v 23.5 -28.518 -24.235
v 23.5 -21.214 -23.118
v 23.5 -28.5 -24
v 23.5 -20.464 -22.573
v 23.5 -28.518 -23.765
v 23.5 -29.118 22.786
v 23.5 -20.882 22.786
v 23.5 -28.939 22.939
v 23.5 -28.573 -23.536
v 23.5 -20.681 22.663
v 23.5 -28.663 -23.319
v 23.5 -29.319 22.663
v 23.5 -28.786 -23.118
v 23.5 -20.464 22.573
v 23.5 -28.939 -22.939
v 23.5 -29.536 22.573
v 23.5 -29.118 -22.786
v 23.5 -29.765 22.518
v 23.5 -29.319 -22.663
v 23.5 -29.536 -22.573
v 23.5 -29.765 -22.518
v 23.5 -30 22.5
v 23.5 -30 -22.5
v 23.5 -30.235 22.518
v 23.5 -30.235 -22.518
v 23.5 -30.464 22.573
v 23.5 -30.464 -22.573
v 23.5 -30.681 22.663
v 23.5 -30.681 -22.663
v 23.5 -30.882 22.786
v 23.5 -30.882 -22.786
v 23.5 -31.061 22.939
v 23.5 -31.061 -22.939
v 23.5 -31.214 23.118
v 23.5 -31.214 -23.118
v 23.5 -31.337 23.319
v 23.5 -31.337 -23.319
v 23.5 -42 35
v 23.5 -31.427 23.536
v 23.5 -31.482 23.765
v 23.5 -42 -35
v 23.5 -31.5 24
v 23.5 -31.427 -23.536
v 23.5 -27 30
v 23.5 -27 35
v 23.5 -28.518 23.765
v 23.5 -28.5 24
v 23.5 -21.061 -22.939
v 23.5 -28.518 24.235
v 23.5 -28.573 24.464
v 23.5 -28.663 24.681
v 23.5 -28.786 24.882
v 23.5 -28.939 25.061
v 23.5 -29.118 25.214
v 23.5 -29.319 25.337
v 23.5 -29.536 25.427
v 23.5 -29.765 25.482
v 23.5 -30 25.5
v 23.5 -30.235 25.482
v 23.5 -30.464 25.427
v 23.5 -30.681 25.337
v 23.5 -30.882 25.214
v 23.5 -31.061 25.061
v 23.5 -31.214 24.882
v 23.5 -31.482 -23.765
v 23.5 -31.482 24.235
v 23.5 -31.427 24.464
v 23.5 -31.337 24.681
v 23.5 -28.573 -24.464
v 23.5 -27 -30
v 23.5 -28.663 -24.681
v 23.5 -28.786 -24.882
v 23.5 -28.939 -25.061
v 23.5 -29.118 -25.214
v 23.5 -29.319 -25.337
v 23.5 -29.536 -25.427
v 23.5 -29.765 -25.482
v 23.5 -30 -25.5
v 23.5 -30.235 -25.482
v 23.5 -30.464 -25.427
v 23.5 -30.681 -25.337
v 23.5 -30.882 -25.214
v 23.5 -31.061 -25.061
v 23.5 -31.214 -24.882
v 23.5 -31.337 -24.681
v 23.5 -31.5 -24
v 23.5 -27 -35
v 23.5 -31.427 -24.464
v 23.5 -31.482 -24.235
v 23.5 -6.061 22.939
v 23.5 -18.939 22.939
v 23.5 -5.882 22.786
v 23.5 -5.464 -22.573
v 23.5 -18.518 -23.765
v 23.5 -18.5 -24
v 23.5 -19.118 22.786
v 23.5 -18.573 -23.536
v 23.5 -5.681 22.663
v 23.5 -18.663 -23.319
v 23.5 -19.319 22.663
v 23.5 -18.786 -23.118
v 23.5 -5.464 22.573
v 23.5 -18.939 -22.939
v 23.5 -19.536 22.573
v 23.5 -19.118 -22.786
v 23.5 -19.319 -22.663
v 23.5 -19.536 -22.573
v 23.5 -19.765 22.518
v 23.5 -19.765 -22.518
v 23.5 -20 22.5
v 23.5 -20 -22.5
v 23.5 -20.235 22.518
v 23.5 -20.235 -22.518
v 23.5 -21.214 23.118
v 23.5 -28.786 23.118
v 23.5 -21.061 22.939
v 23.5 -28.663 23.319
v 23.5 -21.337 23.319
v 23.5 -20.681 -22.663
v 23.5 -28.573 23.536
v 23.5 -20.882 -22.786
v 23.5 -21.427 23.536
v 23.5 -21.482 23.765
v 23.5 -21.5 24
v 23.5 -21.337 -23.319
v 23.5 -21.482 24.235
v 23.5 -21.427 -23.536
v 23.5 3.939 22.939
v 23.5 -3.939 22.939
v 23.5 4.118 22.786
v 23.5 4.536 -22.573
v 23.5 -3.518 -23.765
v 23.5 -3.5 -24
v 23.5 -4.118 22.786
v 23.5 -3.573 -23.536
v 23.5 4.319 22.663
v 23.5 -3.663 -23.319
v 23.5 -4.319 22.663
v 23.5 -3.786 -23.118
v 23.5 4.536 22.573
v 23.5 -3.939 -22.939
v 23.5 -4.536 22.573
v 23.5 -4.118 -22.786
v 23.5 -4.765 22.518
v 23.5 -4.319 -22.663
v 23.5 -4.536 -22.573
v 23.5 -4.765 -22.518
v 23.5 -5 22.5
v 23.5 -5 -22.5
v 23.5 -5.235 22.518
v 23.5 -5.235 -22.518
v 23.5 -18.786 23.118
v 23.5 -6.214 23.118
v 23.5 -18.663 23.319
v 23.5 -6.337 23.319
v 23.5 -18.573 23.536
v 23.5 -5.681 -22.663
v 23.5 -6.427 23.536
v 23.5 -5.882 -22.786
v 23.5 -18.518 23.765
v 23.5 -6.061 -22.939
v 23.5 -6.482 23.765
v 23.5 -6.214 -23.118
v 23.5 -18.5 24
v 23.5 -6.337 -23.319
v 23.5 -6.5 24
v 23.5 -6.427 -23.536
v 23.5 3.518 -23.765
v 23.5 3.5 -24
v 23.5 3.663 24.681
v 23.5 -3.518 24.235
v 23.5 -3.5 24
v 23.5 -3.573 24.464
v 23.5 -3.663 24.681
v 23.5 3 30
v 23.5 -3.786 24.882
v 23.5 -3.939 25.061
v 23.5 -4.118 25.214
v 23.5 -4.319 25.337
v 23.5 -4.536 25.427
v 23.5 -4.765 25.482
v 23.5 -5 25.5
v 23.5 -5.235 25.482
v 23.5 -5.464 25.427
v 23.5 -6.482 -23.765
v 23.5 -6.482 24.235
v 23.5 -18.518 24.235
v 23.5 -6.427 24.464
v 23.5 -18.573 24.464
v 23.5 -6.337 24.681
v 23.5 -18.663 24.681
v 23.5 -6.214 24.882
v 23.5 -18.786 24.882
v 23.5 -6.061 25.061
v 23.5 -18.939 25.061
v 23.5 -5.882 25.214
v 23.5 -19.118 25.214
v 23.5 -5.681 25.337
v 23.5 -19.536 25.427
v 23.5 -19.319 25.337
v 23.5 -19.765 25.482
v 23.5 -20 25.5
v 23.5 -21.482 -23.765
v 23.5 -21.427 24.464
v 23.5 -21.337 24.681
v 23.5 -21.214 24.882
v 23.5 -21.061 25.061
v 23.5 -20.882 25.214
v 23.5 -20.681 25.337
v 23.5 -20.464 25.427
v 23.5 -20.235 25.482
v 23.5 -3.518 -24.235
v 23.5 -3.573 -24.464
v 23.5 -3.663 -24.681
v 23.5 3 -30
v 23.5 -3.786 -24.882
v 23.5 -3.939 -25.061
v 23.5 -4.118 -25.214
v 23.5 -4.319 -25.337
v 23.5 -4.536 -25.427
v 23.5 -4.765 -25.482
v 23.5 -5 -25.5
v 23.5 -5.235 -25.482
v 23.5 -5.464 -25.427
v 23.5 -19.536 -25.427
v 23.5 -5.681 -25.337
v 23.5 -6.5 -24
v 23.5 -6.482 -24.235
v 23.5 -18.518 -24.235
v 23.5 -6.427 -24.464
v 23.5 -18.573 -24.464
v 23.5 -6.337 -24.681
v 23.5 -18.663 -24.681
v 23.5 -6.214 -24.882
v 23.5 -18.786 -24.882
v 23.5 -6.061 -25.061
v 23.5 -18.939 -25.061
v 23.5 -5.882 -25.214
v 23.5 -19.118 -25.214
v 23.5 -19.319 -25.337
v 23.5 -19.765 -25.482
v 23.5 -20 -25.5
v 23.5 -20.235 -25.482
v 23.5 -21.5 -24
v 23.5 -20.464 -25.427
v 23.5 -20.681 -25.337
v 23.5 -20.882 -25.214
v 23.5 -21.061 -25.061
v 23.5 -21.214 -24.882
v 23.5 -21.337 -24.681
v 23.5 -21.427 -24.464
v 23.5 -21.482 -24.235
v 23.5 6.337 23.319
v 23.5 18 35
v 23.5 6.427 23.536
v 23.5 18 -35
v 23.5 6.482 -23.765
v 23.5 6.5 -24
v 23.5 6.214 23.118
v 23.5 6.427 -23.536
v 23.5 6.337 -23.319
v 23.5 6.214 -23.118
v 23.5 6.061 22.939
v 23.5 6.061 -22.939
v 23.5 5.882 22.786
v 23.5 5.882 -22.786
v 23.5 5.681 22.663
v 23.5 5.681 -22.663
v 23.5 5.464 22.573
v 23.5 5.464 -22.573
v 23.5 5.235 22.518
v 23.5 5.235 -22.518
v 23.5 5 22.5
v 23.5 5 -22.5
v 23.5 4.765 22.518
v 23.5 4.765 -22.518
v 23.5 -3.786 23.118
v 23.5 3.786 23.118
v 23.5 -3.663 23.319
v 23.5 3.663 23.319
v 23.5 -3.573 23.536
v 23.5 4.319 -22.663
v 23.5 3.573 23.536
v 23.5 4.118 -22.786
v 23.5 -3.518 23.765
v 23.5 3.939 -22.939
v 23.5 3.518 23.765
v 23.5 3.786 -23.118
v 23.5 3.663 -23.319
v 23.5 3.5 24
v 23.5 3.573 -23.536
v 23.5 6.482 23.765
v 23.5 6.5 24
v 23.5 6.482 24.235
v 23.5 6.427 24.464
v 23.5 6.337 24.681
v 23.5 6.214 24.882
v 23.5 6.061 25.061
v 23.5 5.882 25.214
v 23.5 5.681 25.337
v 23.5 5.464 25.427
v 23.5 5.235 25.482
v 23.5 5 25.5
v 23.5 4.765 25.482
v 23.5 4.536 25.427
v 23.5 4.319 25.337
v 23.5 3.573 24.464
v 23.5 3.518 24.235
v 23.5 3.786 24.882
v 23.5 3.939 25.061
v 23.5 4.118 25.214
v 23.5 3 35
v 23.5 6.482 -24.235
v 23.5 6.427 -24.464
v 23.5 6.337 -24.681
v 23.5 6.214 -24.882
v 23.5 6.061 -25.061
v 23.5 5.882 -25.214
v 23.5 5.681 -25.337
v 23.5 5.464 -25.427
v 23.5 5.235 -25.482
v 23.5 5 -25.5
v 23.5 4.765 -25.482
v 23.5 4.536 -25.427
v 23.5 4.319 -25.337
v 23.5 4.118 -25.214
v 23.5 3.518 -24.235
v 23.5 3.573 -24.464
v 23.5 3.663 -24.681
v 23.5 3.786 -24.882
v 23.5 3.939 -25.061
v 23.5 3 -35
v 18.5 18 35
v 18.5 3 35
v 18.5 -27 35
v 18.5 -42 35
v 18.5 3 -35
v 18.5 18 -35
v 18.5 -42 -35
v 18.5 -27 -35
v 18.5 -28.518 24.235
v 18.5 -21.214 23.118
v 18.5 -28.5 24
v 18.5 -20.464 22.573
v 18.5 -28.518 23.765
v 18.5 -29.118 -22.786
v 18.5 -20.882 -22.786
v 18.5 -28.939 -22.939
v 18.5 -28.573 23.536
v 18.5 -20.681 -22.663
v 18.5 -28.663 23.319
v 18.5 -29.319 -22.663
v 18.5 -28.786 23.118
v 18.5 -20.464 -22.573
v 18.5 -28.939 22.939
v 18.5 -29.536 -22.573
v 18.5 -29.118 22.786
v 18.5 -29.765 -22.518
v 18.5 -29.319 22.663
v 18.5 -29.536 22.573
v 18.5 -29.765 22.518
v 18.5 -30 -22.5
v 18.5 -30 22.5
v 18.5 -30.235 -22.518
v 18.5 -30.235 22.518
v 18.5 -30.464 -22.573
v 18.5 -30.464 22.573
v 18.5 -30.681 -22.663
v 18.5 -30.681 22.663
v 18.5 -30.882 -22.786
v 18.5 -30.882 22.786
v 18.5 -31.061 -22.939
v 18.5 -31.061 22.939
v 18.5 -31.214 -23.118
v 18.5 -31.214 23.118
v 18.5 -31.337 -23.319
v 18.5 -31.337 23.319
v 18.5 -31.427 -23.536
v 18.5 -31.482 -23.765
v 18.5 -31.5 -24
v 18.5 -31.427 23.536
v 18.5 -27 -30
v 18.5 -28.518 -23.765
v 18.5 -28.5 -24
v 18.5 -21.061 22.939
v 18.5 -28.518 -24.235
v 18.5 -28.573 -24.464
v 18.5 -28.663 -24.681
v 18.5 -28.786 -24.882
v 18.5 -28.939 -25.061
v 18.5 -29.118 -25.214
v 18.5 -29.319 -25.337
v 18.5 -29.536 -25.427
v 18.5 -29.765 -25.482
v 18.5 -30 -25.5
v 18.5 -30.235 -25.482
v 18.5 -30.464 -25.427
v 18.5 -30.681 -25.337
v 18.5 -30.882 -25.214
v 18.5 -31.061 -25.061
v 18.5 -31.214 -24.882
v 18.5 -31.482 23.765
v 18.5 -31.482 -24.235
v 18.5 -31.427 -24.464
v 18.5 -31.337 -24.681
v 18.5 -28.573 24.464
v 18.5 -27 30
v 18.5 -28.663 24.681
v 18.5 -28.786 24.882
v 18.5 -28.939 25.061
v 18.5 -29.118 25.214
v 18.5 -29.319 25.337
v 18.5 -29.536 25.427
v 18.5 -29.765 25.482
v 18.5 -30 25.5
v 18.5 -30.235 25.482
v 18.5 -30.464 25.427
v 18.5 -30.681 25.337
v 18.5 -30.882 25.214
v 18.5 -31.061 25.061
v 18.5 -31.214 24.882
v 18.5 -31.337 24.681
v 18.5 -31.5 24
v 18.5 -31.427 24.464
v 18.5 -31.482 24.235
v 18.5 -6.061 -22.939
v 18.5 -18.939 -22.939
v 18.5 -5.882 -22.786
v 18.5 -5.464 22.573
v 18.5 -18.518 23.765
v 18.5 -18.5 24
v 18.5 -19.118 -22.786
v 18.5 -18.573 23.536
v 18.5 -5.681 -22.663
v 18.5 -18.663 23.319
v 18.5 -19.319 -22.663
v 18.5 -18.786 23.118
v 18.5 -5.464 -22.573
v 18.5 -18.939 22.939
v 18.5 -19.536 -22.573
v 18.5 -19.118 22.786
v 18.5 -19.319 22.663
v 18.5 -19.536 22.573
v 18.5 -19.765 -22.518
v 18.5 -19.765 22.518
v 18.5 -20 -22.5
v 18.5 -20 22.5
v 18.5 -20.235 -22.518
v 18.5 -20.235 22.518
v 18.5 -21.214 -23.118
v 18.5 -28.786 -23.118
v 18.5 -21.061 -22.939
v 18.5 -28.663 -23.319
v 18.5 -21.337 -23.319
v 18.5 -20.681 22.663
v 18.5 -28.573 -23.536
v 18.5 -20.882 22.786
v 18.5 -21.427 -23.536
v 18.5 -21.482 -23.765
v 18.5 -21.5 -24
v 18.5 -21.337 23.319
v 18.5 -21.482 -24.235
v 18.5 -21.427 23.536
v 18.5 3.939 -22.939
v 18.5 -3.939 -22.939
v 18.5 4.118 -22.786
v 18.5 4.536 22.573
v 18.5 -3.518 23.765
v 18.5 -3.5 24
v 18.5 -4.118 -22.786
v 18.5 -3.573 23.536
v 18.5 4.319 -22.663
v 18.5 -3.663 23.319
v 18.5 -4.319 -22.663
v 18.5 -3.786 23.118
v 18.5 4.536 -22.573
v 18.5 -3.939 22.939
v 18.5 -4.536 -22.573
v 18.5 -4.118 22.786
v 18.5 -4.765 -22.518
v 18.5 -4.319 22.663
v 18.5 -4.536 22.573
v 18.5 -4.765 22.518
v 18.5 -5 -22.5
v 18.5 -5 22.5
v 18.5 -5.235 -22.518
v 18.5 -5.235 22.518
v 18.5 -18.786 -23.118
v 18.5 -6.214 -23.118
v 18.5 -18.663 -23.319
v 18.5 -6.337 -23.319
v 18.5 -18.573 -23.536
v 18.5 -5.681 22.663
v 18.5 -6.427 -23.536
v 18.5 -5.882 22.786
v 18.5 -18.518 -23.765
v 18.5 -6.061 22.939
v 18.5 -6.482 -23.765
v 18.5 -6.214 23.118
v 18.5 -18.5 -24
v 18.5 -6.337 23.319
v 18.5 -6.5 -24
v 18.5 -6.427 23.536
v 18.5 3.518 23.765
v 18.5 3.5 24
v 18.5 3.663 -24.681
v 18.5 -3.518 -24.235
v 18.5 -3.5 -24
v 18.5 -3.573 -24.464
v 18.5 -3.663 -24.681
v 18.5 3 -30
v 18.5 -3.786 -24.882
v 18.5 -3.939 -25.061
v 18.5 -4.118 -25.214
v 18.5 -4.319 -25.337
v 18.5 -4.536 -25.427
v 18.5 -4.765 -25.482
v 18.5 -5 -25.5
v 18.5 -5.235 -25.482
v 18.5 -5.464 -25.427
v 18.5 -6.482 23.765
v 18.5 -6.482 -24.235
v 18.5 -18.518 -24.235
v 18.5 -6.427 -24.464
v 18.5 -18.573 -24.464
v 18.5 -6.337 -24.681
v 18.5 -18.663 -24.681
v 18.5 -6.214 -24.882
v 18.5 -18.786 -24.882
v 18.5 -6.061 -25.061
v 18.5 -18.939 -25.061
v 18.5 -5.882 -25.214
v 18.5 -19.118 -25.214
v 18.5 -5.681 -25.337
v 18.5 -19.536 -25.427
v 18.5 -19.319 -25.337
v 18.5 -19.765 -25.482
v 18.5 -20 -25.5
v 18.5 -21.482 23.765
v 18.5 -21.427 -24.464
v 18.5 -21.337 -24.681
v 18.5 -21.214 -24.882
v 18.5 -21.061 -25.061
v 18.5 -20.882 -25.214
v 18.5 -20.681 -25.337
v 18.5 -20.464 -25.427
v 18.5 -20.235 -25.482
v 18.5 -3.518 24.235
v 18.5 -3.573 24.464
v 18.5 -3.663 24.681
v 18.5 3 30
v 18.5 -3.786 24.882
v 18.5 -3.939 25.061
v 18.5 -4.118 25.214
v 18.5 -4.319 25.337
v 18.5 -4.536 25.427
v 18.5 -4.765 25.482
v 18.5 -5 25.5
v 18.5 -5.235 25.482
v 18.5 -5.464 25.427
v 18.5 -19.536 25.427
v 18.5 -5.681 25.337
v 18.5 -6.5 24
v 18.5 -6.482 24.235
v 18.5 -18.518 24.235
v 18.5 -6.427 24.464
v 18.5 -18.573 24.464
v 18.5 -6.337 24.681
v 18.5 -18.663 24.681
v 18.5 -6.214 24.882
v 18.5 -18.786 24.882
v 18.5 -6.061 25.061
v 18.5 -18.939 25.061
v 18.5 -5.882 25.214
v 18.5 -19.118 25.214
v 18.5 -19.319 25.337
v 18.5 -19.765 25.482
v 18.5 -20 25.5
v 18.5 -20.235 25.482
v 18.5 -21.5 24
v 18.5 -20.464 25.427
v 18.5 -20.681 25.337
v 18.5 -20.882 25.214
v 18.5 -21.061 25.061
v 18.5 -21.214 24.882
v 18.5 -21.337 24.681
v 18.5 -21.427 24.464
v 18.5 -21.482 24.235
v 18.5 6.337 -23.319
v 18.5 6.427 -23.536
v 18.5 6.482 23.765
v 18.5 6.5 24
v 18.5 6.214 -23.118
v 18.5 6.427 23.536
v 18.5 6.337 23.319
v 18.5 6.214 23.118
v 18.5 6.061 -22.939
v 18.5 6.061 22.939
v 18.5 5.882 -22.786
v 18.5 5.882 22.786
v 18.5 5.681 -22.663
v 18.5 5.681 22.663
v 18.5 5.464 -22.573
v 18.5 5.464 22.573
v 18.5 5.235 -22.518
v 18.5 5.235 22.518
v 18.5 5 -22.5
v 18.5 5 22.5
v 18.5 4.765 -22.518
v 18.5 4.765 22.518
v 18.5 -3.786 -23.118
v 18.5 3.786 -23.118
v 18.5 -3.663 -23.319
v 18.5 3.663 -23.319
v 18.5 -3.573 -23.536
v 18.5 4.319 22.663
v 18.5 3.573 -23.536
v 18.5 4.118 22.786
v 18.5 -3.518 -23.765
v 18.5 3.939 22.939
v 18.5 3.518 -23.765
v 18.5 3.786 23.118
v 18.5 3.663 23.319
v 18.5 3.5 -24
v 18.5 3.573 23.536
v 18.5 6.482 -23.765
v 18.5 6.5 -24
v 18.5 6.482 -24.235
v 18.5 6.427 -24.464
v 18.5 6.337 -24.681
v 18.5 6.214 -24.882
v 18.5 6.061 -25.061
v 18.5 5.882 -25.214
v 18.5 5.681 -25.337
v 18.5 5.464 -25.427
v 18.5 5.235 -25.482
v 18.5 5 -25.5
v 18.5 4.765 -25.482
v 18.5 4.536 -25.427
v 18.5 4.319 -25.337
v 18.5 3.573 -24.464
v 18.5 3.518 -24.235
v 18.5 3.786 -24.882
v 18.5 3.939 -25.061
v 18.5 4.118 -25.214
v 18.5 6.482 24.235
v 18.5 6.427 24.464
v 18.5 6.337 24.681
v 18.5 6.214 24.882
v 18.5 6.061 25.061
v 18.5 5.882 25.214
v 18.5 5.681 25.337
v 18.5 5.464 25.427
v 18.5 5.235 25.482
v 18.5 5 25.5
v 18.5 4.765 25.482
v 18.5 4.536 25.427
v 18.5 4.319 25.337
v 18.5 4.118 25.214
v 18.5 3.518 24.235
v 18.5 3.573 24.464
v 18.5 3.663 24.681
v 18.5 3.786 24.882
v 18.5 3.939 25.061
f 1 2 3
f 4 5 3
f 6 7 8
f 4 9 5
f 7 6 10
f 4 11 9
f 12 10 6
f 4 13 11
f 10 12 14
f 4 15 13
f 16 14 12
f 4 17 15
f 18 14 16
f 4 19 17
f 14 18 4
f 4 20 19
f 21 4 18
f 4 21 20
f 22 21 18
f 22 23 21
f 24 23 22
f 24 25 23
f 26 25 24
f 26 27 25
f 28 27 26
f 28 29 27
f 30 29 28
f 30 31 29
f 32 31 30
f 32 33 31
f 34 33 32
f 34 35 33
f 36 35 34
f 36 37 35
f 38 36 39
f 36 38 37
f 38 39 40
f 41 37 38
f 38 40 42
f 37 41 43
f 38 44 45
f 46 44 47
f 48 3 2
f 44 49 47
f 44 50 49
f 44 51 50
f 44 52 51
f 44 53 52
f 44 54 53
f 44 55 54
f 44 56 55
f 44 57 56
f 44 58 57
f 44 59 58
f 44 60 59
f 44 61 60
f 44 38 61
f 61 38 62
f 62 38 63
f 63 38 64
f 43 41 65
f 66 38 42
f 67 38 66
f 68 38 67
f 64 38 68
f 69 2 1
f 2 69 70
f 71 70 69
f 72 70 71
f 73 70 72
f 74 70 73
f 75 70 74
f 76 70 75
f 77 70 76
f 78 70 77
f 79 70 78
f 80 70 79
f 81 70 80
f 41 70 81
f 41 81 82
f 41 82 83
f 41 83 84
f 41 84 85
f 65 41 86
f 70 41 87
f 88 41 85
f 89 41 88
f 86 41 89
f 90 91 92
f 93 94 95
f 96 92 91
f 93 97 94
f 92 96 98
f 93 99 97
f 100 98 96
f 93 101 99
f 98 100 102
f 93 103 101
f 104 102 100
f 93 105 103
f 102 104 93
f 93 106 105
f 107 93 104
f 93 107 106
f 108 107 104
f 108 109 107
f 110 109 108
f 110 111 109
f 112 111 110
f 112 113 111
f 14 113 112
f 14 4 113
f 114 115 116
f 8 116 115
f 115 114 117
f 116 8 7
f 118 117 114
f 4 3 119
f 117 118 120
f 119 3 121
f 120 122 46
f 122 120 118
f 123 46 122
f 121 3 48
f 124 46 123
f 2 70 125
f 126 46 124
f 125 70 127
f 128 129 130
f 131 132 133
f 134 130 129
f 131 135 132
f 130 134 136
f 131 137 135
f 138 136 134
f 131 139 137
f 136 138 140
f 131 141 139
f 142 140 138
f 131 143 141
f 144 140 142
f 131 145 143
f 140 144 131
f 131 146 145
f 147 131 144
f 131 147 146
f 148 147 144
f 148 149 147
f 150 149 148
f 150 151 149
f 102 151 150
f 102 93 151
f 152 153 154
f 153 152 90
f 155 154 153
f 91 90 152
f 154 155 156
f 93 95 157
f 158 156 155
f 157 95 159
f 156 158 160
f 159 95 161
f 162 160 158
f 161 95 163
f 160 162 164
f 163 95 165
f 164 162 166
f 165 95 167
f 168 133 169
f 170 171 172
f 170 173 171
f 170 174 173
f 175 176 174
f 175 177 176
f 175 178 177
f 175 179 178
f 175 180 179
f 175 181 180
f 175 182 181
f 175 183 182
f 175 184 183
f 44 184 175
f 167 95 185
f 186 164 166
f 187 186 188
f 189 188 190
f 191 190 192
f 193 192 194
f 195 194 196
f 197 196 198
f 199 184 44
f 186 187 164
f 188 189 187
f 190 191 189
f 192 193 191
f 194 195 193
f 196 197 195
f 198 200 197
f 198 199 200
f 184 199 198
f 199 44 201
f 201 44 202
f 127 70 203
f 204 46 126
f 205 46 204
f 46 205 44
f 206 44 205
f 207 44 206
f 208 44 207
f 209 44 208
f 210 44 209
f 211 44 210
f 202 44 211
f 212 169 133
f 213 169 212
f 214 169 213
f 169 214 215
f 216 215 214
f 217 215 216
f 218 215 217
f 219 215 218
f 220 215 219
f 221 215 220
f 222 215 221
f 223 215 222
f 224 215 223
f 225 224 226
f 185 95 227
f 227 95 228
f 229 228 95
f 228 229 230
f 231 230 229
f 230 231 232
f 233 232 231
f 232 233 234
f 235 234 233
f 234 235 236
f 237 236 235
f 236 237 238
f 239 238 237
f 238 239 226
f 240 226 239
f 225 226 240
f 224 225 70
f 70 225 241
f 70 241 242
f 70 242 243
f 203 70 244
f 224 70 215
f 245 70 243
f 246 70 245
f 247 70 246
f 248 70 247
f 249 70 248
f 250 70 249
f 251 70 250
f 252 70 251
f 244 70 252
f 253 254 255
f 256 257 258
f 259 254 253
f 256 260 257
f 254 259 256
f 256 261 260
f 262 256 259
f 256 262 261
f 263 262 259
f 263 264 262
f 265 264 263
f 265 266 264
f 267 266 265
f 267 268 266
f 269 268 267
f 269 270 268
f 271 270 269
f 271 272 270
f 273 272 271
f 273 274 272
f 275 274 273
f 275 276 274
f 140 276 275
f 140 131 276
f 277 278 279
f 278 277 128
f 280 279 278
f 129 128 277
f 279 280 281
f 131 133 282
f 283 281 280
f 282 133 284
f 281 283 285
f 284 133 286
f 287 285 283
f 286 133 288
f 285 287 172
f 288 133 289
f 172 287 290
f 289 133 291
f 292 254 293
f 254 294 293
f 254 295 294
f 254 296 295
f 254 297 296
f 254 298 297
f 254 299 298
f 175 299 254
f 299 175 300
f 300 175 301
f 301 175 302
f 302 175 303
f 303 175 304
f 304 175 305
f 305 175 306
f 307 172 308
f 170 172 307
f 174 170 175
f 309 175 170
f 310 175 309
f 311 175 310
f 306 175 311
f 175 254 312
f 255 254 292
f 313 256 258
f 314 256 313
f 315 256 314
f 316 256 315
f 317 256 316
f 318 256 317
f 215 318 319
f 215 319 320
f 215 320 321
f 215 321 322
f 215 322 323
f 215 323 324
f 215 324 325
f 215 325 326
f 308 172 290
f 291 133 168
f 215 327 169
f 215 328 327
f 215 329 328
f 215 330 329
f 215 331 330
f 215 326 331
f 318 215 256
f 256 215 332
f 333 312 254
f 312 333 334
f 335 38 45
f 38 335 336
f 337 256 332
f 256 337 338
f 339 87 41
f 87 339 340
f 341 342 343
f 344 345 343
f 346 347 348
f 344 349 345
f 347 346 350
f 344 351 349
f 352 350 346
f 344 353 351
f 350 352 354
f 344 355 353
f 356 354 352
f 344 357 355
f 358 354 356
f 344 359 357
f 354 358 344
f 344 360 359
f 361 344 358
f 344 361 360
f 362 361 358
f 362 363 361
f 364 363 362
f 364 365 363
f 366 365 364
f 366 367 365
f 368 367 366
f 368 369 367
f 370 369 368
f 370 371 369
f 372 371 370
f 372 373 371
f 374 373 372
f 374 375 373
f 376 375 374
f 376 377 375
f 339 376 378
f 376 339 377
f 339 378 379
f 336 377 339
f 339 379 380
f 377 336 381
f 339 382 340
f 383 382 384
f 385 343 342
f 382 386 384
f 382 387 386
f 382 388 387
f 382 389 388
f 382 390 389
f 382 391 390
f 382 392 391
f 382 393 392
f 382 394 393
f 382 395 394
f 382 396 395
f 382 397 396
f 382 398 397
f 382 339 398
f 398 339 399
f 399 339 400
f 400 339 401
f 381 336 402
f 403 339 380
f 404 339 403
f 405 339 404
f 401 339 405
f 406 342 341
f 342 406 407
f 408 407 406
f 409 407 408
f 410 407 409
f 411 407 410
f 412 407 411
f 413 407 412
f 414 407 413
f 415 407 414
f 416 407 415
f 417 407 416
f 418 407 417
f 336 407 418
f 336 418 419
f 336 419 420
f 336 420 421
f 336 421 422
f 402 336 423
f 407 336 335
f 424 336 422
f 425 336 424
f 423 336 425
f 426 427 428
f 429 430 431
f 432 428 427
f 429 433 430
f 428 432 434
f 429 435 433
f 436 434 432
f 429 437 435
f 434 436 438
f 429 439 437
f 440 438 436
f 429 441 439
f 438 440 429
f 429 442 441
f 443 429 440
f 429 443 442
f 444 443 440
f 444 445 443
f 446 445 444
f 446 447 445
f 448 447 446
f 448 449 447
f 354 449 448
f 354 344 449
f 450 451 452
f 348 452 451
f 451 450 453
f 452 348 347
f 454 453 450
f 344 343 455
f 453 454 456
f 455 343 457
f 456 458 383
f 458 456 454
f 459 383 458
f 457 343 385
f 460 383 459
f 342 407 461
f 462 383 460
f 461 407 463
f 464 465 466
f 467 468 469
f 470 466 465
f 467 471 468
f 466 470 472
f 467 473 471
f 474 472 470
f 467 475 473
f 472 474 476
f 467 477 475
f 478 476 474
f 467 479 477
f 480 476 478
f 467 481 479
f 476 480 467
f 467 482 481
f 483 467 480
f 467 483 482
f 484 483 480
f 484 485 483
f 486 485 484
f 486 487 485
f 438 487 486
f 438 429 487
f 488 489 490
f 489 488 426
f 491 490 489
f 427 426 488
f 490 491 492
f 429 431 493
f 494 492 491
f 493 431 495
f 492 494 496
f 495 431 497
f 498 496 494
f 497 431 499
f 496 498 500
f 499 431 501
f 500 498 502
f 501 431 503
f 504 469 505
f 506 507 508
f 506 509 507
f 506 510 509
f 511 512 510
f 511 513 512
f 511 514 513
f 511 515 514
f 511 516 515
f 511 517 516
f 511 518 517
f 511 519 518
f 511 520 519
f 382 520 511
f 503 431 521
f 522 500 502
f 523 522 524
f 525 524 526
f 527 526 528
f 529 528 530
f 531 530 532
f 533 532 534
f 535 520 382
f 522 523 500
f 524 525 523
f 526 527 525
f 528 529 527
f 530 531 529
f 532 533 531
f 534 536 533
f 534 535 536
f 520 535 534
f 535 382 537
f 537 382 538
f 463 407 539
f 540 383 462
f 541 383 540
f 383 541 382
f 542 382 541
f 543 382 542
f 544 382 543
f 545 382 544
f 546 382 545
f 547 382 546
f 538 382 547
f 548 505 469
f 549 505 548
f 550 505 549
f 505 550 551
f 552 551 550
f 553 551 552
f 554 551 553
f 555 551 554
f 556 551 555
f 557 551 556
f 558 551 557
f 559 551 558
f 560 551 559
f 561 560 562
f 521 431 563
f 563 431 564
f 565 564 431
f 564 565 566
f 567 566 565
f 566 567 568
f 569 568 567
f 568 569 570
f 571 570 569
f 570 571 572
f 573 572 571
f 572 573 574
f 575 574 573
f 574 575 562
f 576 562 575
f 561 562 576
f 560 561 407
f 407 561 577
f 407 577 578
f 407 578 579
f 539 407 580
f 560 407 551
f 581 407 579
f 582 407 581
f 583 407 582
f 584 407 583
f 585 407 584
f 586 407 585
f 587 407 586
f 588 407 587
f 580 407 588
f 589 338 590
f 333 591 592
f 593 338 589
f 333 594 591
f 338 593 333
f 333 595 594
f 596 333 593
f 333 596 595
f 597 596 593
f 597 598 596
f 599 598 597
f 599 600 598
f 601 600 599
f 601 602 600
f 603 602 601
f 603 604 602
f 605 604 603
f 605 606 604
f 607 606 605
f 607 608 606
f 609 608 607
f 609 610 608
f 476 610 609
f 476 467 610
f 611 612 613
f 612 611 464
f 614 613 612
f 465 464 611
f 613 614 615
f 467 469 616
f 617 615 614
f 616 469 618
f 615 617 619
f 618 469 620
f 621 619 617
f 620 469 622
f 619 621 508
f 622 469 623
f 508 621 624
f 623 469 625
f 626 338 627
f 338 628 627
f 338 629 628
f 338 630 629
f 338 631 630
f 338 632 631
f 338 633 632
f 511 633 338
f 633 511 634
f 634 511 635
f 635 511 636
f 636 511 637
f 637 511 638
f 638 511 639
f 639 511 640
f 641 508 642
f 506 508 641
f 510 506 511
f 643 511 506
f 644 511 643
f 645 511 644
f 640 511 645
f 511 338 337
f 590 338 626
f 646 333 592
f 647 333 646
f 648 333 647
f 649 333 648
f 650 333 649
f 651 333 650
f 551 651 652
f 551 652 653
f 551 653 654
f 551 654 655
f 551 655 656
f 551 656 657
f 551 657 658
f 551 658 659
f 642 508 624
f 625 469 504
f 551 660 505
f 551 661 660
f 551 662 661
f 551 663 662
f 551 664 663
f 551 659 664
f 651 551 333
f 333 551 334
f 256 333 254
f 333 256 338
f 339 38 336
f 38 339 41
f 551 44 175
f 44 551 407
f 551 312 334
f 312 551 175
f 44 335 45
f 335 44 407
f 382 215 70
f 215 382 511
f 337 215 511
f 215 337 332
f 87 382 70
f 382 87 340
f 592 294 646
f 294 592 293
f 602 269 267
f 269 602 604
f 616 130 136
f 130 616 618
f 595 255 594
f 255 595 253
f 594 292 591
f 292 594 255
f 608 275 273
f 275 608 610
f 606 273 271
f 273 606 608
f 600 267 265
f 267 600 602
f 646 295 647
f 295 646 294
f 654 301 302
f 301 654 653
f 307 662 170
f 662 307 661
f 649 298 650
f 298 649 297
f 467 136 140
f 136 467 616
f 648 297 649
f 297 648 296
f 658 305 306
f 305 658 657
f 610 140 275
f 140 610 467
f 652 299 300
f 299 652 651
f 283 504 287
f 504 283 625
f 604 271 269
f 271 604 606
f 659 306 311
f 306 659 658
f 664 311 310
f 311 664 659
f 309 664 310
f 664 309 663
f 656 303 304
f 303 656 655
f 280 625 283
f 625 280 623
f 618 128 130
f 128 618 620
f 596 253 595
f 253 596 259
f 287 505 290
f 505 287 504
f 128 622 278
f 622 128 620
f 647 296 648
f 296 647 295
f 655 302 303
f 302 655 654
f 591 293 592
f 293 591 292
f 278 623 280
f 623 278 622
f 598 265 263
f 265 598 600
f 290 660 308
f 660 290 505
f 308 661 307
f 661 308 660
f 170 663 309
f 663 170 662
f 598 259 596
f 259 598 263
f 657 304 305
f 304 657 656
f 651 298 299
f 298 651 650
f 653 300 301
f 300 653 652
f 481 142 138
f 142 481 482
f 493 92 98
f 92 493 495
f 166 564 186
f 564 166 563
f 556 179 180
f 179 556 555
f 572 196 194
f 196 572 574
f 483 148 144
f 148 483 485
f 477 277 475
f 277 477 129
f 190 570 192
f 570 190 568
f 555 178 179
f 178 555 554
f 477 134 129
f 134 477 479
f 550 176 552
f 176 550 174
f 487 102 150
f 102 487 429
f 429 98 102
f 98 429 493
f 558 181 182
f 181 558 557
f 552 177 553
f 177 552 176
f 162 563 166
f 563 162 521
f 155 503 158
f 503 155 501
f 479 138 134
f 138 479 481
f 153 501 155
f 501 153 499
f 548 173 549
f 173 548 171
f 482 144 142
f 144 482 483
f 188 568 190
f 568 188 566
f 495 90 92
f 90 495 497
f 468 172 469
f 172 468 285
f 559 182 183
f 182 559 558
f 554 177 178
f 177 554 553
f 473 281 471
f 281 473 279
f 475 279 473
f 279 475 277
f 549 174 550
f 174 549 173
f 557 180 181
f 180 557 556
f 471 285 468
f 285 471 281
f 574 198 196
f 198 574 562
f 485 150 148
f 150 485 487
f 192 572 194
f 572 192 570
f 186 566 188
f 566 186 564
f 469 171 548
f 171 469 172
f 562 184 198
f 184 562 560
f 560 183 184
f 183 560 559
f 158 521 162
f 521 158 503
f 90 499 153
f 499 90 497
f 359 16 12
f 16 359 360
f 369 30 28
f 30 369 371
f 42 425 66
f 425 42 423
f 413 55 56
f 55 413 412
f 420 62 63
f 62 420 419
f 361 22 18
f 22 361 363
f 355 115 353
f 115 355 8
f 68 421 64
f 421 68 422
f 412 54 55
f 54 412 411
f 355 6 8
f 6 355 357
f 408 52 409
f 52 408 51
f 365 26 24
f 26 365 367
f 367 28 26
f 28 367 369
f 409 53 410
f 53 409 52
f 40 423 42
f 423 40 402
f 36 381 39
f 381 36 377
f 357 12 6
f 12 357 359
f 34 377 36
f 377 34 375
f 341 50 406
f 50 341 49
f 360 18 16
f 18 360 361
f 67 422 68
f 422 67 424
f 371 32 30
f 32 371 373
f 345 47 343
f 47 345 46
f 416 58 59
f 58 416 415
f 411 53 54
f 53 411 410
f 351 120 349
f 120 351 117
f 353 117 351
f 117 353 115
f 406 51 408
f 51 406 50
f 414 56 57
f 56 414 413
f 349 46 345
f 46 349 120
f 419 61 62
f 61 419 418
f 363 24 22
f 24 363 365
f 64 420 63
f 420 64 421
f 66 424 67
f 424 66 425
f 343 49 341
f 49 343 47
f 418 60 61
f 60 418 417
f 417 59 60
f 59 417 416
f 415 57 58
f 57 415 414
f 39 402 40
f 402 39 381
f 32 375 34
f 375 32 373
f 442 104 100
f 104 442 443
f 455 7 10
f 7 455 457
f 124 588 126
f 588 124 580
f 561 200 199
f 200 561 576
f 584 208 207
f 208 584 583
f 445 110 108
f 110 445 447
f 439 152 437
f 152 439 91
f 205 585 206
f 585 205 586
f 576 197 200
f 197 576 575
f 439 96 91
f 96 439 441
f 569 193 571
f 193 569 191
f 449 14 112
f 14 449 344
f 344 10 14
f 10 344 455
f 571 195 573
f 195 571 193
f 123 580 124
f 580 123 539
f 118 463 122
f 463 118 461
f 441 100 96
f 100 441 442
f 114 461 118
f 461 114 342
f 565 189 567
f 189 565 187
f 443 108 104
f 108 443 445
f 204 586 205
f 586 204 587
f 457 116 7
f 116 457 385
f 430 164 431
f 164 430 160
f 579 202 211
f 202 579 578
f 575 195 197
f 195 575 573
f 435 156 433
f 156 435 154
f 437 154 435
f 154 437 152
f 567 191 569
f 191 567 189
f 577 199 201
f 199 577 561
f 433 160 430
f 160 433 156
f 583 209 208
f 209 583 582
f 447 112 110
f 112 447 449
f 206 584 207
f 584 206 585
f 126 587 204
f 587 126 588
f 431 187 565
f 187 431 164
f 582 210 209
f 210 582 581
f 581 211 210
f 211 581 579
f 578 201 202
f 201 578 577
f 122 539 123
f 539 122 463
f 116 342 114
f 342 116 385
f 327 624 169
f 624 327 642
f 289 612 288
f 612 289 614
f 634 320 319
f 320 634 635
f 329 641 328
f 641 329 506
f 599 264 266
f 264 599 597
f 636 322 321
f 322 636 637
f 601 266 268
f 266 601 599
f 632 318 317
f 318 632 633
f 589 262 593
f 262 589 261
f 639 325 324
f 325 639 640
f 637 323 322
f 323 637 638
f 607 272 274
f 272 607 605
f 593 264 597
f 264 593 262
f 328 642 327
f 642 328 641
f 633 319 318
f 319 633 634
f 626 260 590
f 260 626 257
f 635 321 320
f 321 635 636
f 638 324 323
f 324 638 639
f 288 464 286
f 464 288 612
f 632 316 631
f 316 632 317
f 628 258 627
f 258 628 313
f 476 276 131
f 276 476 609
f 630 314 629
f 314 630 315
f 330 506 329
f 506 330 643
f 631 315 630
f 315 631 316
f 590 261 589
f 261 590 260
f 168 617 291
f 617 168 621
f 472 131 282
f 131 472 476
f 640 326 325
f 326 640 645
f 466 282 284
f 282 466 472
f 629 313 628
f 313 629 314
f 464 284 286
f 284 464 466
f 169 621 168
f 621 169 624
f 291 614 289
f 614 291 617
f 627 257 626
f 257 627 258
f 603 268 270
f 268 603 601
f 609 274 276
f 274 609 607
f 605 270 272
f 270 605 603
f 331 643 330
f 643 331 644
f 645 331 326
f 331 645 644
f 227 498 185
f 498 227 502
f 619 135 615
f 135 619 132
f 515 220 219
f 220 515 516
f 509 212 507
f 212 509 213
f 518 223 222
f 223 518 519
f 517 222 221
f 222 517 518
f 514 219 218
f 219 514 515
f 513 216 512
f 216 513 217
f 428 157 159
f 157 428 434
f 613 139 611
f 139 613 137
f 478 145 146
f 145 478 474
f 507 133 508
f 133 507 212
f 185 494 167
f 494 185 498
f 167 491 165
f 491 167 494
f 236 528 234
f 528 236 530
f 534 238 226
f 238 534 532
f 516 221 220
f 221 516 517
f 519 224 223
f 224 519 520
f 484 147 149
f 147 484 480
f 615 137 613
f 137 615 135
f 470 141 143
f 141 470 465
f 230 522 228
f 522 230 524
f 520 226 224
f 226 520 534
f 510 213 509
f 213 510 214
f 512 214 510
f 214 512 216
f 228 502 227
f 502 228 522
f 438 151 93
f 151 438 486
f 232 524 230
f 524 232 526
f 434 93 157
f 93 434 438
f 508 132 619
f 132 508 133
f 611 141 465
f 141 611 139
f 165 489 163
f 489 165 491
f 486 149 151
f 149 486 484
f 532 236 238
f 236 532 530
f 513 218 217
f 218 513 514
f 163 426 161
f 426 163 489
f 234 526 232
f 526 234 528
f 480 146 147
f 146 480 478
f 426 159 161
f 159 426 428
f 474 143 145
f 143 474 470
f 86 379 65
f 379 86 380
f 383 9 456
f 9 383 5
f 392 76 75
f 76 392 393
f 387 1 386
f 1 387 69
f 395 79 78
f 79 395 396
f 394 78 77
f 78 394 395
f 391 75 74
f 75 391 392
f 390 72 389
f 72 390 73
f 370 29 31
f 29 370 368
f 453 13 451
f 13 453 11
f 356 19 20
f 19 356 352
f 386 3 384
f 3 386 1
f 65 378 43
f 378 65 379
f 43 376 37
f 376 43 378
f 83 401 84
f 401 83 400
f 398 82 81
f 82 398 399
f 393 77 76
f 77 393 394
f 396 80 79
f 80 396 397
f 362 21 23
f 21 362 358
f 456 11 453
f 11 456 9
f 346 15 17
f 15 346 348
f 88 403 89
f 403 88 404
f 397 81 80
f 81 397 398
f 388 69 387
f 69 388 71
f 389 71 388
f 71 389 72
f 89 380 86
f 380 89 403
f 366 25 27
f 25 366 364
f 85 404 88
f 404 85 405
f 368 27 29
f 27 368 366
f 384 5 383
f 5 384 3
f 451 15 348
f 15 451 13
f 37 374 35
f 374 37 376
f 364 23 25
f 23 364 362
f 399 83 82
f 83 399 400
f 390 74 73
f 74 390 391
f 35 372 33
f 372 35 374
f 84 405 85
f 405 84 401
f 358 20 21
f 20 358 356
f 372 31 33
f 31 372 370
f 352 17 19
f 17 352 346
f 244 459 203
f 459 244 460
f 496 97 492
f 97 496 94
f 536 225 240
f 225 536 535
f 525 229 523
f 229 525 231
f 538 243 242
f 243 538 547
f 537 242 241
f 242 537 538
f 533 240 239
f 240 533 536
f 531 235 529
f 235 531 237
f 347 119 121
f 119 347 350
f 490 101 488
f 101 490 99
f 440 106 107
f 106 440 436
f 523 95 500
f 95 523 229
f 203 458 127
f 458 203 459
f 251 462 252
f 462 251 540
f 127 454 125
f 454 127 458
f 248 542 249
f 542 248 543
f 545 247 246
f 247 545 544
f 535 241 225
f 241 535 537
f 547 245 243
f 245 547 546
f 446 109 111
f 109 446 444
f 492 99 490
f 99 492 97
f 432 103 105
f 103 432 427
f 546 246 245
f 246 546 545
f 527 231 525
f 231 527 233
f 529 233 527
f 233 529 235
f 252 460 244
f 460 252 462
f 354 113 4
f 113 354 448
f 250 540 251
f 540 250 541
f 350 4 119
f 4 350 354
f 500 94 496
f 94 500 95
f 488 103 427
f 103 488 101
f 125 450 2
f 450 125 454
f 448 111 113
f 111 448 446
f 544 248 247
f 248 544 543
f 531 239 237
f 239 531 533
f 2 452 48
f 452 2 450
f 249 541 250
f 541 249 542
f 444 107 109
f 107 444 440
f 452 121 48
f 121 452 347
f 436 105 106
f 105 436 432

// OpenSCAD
//Soporte para los motores

difference(){
union(){
translate([21,-12,0])
cube([5,60,70], center=true);
}

//Enlace a tapa superior e inferior
translate([-20,-12,35])
rotate([0,0,0])
cube([10,30,10], center=true);
translate([20,-12,35])
rotate([0,0,0])
cube([10,30,10], center=true);
translate([0,-60,35])
rotate([0,0,90])
cube([10,30,10], center=true);

translate([-20,-12,-35])
rotate([0,0,0])
cube([10,30,10], center=true);
translate([20,-12,-35])
rotate([0,0,0])
cube([10,30,10], center=true);
translate([0,-60,-35])
rotate([0,0,90])
cube([10,30,10], center=true);

//Agujeros
translate([0,5,24])
rotate([0,90,0])
cylinder(r=3/2, h=100, $fn=40, center=true);
translate([0,-5,24])
rotate([0,90,0])
cylinder(r=3/2, h=100, $fn=40, center=true);
translate([0,-30,24])
rotate([0,90,0])
cylinder(r=3/2, h=100, $fn=40, center=true);
translate([0,-20,24])
rotate([0,90,0])
cylinder(r=3/2, h=100, $fn=40, center=true);

translate([0,5,-24])
rotate([0,90,0])
cylinder(r=3/2, h=100, $fn=40, center=true);
translate([0,-5,-24])
rotate([0,90,0])
cylinder(r=3/2, h=100, $fn=40, center=true);
translate([0,-30,-24])
rotate([0,90,0])
cylinder(r=3/2, h=100, $fn=40, center=true);
translate([0,-20,-24])
rotate([0,90,0])
cylinder(r=3/2, h=100, $fn=40, center=true);
}
